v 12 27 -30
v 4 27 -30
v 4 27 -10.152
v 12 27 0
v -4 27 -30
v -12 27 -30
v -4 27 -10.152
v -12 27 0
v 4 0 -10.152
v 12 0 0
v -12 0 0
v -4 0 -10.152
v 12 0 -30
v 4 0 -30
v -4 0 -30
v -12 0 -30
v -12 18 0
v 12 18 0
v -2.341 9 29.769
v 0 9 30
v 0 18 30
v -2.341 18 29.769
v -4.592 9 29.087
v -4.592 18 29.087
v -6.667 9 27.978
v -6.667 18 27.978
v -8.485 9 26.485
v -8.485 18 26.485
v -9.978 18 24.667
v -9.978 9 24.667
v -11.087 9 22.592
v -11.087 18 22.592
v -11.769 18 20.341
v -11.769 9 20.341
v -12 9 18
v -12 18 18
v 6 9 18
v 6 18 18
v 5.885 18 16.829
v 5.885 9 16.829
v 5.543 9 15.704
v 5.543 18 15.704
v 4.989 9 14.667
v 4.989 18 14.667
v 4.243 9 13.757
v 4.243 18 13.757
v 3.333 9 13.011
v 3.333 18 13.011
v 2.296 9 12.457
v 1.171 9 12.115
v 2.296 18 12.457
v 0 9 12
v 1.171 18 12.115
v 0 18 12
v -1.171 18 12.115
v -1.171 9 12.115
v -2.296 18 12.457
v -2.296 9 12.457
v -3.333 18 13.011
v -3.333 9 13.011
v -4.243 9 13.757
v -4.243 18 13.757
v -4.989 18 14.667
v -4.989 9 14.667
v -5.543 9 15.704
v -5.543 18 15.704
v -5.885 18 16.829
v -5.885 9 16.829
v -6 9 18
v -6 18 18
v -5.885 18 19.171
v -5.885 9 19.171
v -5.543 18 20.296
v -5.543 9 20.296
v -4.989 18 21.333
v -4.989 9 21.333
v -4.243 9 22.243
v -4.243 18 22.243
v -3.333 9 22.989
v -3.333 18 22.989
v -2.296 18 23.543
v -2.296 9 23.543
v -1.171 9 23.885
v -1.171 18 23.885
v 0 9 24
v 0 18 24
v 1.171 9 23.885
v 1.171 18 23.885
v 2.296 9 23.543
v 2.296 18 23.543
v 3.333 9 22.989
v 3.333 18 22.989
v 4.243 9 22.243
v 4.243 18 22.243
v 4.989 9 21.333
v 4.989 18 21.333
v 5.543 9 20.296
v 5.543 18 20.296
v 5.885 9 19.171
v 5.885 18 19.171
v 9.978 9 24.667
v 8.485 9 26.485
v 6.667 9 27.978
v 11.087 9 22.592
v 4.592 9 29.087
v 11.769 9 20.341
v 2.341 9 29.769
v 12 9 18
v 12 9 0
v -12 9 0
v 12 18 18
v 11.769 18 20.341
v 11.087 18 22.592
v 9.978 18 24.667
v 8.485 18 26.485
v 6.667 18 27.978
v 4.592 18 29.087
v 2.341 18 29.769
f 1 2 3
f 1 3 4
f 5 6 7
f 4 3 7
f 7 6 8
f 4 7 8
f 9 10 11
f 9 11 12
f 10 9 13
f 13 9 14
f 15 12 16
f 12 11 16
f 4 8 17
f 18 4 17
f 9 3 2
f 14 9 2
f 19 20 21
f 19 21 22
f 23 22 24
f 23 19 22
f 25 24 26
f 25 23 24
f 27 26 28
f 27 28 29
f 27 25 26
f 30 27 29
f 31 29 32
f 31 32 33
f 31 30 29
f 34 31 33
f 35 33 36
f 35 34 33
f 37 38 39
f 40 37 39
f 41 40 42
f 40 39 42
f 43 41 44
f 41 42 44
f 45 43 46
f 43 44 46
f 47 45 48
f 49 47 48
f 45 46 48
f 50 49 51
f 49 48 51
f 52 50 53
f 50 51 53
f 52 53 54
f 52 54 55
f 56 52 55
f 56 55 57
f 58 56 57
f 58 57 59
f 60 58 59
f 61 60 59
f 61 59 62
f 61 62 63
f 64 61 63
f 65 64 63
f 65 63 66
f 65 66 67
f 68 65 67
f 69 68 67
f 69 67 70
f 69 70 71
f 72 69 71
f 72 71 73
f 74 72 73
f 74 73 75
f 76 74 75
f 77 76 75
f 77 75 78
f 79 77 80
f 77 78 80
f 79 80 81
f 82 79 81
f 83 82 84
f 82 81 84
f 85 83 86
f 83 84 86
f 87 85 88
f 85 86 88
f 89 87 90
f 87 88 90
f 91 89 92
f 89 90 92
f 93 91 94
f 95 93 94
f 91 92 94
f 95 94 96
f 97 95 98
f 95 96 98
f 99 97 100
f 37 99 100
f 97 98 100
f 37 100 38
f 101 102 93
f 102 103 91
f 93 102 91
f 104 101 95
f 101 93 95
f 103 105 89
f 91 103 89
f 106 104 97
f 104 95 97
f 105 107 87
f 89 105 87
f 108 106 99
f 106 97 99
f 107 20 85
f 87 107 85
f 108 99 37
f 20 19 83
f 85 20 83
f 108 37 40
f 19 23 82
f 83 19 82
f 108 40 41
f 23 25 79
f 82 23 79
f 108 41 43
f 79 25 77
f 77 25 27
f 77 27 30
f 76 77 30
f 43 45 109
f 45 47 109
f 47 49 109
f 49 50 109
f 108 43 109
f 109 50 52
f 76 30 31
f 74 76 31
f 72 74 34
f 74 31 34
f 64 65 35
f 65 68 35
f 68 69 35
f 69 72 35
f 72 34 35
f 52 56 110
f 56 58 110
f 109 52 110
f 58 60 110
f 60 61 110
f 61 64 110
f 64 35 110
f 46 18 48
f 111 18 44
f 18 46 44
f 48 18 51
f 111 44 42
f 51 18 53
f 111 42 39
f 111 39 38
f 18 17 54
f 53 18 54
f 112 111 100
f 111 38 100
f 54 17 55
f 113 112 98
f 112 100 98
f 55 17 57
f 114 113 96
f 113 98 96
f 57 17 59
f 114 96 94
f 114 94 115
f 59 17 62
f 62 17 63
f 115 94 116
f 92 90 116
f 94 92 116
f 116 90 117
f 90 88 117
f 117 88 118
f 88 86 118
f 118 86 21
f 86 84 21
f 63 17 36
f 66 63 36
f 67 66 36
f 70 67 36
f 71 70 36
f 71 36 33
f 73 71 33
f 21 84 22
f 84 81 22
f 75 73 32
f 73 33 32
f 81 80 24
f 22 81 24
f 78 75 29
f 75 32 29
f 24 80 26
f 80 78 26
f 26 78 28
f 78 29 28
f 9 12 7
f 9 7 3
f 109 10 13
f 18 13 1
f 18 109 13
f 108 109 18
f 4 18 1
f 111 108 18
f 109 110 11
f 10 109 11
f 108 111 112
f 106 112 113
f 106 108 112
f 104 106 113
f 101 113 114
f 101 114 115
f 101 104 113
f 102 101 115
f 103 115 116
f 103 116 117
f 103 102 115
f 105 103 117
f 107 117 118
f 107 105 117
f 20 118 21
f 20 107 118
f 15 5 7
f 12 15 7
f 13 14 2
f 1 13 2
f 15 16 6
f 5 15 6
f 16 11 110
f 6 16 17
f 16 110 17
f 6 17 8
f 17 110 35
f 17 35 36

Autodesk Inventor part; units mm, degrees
ref_plane "YZ Plane" through (0, 0, 0) normal (1, 0, 0) x (0, 1, 0)
ref_plane "XZ Plane" through (0, 0, 0) normal (0, 1, 0) x (-1, 0, 0)
ref_plane "XY Plane" through (0, 0, 0) normal (0, 0, 1) x (1, 0, 0)
sketch "Sketch1" plane through (0, 0, 0) normal (1, 0, 0) x (0, 1, 0)
  line L0 (0, 0) -> (0, -30)
  line L1 (0, -30) -> (27, -30)
  line L2 (27, -30) -> (27, 0)
  line L3 (27, 0) -> (18, 0)
  line L4 (18, 0) -> (18, 30)
  line L5 (18, 30) -> (9, 30)
  line L6 (9, 30) -> (9, 0)
  line L7 (9, 0) -> (0, 0)
  dimension "d0" = 30
  dimension "d1" = 27
  dimension "d3" = 9
  dimension "d4" = 9
  dimension "d5" = 30
extrude "Extrusion1" add sketch "Sketch1" along normal mid plane 24
fillet "Fillet1" radius 12 1 edges at (12, 13.5, 30)
fillet "Fillet2" radius 12 1 edges at (-12, 13.5, 30)
sketch "Sketch2" plane through (-12, 18, 0) normal (0, 1, 0) x (1, 0, 0)
  circle A0 centre (12, -18) radius 6
  line L0 (0, 0) -> (24, 0) projected
  line L1 (0, 30) -> (24, 30) projected
  point P0 (12, 0)
  dimension "d10" = 12
  dimension "d11" = 18
sketch "Sketch3" plane through (-12, 27, 0) normal (0, 1, 0) x (1, 0, 0)
  line L0 (0, 30) -> (24, 30) projected
  line L1 (8, 30) -> (8, 10.1515)
  line L2 (8, 10.1515) -> (16, 10.1515)
  line L3 (16, 10.1515) -> (16, 30)
  line L4 (24, 30) -> (24, 0) projected
  line L5 (8, 30) -> (16, 30)
  point P0 (12, 0)
  dimension "d12" = 8
  dimension "d13" = 8
extrude "Extrusion2" cut sketch "Sketch2" against normal through all
extrude "Extrusion3" cut sketch "Sketch3" against normal through all
